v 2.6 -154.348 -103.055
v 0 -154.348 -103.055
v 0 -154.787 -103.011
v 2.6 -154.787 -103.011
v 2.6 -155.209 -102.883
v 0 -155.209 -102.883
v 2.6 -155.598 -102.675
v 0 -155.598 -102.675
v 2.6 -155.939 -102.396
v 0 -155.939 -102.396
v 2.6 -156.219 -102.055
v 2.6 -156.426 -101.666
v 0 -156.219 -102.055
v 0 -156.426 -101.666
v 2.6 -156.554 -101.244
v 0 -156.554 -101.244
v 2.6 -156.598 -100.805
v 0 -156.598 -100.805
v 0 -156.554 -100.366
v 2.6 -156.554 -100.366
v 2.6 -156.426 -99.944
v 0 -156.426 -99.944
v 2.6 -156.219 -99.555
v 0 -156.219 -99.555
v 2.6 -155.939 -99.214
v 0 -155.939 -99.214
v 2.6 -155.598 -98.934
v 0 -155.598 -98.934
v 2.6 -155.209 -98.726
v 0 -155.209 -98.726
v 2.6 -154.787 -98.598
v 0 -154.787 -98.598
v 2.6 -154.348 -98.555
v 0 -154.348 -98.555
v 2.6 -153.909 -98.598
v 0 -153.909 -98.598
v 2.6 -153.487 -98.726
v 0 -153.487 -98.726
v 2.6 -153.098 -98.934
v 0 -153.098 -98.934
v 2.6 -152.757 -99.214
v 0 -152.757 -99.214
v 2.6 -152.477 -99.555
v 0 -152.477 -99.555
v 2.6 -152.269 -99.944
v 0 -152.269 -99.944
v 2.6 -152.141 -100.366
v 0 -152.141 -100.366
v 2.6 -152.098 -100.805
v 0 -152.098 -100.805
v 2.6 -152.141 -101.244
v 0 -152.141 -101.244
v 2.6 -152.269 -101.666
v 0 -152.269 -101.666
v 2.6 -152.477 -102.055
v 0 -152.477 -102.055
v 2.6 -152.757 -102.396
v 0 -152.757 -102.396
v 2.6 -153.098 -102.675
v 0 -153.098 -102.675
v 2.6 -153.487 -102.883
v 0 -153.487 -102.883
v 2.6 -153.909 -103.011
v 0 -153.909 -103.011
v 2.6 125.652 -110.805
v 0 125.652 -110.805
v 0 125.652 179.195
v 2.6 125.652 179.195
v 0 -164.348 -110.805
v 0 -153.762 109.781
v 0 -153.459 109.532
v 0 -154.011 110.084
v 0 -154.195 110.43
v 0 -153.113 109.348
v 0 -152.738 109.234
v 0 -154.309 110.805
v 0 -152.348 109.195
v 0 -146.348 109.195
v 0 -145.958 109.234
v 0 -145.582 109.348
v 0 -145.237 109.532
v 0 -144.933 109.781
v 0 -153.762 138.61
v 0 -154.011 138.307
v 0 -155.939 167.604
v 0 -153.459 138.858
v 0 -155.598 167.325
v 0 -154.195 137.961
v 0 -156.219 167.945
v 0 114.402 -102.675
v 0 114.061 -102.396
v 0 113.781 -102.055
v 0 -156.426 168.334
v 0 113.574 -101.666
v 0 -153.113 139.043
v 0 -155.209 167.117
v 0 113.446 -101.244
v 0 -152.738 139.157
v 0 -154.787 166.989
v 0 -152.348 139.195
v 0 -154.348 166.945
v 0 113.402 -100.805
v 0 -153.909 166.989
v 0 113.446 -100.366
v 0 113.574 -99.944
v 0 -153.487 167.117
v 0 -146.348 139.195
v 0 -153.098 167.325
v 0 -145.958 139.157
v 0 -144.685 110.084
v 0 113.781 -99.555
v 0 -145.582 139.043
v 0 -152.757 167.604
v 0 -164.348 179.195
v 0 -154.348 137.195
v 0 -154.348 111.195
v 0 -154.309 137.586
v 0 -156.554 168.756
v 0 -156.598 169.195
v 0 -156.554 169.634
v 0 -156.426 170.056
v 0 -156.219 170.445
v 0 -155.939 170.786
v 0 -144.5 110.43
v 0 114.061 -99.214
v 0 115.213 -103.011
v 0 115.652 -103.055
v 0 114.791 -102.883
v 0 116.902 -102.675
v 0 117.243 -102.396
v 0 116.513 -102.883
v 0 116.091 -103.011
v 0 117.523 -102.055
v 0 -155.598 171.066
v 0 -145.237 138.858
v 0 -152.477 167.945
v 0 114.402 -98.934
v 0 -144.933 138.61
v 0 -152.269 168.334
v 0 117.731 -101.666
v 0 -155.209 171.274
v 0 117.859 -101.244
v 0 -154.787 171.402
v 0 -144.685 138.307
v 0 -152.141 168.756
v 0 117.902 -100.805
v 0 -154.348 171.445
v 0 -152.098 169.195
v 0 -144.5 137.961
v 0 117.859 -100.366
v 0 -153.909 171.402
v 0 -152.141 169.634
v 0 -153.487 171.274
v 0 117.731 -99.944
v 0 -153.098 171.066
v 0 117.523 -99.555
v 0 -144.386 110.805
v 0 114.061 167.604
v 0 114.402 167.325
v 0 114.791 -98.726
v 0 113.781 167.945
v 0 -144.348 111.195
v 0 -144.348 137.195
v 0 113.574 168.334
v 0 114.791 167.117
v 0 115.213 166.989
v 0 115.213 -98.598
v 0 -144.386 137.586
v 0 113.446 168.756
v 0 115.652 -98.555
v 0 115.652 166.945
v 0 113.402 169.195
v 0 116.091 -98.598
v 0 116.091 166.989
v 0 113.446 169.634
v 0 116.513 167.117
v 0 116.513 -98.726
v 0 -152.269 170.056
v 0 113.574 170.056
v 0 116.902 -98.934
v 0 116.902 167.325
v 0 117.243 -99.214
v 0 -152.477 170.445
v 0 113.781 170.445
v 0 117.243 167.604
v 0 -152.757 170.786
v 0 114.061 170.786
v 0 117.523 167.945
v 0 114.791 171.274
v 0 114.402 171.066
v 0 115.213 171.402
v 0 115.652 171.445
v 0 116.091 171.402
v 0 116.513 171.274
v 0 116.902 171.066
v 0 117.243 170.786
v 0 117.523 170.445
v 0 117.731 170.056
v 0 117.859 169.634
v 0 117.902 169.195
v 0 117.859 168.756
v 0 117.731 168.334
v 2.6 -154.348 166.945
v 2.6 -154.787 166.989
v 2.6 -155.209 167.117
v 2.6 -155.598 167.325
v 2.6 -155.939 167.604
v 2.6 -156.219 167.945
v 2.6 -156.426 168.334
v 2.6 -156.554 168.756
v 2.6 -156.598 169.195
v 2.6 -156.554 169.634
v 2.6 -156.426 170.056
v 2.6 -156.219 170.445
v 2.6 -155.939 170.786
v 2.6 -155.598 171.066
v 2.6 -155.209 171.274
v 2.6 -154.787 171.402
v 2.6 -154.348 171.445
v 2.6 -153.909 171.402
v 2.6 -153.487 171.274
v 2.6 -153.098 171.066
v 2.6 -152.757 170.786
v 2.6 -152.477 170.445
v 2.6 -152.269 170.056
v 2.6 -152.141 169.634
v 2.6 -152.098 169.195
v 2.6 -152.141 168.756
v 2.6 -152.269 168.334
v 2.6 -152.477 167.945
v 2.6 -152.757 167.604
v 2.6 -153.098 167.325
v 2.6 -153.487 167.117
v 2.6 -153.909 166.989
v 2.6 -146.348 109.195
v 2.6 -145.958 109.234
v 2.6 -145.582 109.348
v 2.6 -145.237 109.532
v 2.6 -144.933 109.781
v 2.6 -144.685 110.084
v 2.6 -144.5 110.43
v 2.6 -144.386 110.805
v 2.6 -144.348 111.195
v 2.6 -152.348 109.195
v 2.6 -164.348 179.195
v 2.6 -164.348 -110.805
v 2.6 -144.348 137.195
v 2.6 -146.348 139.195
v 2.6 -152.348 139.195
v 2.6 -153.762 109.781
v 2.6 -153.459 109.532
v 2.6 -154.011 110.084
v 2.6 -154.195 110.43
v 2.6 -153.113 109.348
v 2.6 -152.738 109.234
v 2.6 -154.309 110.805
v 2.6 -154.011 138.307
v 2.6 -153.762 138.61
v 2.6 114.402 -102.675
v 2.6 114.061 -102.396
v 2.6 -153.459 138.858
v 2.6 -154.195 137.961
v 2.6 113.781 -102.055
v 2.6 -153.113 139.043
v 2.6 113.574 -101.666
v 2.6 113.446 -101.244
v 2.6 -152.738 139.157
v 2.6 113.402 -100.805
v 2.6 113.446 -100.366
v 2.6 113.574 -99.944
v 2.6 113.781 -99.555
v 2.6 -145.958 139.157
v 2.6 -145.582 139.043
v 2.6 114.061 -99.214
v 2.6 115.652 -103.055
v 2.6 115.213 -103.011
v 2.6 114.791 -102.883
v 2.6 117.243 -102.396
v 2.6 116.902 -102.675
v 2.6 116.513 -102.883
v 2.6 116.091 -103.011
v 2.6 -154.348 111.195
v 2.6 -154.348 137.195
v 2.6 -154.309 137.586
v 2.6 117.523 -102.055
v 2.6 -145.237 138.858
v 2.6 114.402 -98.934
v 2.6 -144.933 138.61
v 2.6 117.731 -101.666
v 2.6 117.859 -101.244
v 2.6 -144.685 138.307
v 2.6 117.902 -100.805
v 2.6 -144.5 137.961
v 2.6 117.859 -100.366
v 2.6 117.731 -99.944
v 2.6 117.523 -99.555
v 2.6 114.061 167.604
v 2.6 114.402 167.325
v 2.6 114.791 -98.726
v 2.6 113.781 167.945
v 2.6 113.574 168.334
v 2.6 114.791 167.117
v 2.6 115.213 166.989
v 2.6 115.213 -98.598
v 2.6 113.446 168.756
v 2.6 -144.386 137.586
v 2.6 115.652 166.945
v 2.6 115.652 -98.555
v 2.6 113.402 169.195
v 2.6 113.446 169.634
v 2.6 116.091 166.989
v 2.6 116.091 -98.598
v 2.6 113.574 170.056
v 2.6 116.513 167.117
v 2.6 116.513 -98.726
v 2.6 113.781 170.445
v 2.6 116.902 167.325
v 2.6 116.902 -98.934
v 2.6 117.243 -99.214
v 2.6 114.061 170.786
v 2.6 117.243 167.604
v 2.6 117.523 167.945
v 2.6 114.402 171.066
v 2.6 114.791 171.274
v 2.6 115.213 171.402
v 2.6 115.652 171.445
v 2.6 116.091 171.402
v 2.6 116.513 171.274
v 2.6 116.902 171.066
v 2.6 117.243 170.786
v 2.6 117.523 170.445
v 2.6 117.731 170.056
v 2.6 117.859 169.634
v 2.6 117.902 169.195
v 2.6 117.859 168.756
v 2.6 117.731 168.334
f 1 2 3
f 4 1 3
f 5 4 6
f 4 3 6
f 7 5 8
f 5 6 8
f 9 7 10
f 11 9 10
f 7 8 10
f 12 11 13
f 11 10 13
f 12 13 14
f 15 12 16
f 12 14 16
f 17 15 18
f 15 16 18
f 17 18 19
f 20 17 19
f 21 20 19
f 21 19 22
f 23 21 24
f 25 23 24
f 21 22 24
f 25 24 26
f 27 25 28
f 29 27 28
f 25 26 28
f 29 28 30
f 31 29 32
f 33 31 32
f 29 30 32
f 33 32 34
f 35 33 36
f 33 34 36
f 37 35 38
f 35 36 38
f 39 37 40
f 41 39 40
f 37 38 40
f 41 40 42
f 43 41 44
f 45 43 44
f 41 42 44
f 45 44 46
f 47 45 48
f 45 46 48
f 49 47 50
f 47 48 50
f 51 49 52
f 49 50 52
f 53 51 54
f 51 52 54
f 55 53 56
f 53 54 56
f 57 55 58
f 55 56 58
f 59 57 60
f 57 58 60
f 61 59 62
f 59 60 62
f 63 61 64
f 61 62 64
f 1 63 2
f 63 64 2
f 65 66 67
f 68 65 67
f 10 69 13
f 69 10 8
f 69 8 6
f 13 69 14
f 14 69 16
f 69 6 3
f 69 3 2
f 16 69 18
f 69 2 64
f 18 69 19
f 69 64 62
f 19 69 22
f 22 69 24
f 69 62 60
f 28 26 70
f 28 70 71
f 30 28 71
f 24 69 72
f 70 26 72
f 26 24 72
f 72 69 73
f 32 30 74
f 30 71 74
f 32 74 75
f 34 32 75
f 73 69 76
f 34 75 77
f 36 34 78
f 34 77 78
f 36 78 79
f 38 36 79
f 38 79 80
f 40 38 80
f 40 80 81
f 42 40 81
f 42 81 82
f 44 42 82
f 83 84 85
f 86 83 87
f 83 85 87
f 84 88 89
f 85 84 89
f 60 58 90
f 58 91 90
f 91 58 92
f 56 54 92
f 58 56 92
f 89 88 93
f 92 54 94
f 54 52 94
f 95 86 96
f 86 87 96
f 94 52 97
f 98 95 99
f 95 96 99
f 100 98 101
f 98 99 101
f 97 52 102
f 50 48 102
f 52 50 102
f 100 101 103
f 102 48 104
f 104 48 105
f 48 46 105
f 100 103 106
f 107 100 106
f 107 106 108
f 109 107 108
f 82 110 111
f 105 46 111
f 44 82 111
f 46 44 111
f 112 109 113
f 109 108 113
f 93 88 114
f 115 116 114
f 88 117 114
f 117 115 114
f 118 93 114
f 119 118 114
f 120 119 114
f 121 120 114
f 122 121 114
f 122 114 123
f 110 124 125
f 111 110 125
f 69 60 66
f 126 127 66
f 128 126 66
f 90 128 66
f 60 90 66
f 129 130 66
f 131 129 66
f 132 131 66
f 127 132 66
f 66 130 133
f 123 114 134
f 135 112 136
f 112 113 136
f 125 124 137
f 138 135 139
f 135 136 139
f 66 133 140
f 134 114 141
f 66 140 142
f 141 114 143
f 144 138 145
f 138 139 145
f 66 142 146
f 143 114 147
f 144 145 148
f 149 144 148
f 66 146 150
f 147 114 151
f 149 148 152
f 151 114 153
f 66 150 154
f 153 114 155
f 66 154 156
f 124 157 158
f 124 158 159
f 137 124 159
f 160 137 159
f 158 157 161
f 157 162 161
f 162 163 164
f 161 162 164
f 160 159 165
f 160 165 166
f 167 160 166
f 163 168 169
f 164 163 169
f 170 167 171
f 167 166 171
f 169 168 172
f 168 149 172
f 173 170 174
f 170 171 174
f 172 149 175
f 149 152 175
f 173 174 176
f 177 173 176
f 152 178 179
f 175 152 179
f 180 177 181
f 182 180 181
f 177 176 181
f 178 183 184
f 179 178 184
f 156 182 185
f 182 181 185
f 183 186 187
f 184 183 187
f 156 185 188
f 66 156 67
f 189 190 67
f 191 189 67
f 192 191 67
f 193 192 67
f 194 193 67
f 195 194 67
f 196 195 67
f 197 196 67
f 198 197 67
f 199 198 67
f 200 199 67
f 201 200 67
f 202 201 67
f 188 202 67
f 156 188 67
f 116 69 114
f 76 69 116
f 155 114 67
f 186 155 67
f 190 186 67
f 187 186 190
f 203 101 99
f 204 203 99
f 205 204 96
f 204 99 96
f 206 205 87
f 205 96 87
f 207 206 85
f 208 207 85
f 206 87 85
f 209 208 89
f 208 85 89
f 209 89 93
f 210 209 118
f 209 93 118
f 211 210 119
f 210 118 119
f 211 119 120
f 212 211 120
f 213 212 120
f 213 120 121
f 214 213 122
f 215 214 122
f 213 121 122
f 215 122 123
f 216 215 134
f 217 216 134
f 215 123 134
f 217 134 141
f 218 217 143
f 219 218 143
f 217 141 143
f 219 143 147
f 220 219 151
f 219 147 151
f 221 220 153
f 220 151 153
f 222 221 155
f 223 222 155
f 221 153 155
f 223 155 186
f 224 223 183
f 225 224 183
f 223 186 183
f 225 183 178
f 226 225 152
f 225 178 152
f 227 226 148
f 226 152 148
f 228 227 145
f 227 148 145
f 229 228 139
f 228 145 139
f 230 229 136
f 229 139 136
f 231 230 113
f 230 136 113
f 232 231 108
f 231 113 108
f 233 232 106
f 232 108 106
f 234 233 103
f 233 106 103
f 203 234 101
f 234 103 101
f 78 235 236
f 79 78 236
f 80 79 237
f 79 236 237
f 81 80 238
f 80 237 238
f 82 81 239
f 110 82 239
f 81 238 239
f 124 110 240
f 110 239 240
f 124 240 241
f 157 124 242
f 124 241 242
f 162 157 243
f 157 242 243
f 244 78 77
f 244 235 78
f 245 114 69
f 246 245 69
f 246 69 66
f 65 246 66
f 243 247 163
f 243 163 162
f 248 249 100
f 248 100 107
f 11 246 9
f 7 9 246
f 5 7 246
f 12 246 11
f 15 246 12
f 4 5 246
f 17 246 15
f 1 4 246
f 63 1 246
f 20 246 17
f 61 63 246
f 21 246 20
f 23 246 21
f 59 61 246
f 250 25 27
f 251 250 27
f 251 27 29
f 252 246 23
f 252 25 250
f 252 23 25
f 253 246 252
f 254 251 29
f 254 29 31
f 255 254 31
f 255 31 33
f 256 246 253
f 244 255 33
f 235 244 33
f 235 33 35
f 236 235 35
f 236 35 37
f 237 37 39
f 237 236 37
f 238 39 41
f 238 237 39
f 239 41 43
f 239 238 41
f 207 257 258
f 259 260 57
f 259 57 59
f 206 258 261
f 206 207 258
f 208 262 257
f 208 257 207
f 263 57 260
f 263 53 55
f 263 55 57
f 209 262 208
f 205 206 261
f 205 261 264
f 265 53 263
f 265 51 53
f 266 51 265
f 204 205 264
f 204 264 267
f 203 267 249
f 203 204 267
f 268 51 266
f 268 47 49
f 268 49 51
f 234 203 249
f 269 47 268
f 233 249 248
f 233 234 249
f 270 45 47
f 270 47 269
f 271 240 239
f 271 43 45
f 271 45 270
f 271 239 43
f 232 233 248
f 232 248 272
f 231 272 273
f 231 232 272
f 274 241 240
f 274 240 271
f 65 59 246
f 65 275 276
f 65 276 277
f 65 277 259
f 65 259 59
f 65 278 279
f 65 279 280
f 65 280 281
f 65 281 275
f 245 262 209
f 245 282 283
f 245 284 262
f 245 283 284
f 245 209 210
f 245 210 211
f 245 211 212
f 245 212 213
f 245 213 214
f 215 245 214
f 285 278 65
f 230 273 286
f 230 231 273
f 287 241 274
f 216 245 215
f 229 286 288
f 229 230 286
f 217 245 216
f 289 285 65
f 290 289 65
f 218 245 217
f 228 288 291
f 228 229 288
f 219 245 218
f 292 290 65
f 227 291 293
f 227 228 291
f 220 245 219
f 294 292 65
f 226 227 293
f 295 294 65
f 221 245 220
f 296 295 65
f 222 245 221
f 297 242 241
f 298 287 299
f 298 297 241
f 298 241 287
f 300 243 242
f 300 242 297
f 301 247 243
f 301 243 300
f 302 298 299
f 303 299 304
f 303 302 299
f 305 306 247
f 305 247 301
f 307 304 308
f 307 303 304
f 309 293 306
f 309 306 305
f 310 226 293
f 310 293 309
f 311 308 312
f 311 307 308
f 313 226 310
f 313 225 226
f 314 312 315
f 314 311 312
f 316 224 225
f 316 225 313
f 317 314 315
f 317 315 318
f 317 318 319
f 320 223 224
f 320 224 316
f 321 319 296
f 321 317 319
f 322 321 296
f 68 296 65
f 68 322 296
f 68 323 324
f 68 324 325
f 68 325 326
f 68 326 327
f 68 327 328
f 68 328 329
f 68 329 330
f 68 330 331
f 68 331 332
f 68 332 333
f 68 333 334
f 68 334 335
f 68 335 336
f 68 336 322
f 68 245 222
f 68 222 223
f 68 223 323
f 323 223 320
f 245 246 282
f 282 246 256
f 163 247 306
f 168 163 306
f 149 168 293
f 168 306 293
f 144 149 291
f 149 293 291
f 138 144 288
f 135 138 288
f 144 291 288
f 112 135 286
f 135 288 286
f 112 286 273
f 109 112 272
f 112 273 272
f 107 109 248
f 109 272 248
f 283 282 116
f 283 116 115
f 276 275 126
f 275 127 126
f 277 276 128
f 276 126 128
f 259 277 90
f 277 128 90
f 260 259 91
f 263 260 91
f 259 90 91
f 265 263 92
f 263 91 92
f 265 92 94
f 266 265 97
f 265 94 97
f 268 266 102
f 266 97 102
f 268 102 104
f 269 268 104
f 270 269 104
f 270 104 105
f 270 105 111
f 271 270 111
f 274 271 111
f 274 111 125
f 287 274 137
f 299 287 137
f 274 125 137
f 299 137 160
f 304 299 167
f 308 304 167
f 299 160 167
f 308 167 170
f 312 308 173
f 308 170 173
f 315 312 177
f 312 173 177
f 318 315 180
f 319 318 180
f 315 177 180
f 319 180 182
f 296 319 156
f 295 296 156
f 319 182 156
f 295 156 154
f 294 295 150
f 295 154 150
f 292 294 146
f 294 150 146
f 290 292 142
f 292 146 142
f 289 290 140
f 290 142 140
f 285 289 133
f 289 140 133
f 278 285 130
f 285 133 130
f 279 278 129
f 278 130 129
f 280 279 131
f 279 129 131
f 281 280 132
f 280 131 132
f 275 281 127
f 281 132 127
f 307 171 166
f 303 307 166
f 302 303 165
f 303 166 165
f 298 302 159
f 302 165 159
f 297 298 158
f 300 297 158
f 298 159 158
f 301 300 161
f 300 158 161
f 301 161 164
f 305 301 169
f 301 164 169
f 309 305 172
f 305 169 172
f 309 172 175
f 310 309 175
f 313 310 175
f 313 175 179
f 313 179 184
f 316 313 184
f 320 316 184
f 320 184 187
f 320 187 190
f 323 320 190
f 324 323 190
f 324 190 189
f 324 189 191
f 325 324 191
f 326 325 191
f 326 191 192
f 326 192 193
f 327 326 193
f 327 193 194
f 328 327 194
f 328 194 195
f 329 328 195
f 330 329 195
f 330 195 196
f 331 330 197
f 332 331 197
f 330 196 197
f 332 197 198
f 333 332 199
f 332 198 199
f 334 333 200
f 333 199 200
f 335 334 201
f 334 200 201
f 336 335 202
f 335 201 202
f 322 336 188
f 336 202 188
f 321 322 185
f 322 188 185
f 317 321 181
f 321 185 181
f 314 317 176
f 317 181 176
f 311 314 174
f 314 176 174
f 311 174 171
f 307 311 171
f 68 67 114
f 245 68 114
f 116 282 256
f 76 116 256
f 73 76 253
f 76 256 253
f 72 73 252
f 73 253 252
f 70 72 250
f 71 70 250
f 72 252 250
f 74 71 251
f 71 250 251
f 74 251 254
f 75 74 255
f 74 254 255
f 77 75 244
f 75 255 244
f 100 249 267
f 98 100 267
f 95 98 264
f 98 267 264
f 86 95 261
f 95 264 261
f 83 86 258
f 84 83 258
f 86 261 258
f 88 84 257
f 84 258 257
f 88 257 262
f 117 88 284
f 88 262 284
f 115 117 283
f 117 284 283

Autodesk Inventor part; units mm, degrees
ref_plane "YZ Plane" through (0, 0, 0) normal (1, 0, 0) x (0, 1, 0)
ref_plane "XZ Plane" through (0, 0, 0) normal (0, 1, 0) x (-1, 0, 0)
ref_plane "XY Plane" through (0, 0, 0) normal (0, 0, 1) x (1, 0, 0)
sketch "スケッチ1" plane through (0, 0, 0) normal (1, 0, 0) x (0, 1, 0)
  line L0 (125.6523, 179.1954) -> (-164.3477, 179.1954)
  line L1 (-164.3477, 179.1954) -> (-164.3477, -110.8046)
  line L2 (-164.3477, -110.8046) -> (125.6523, -110.8046)
  line L3 (125.6523, -110.8046) -> (125.6523, 179.1954)
  point P0 (0, 0)
  dimension "d0" = 290
  dimension "d1" = 290
extrude "押し出し1" add sketch "スケッチ1" along normal blind 2.6
sketch "スケッチ2" plane through (2.6, 0, 0) normal (1, 0, 0) x (0, 0, -1)
  line L0 (-179.1954, 125.6523) -> (-179.1954, -164.3477) projected
  line L1 (-179.1954, -164.3477) -> (110.8046, -164.3477) projected
  line L2 (110.8046, -164.3477) -> (110.8046, 125.6523) projected
  line L3 (110.8046, 125.6523) -> (-179.1954, 125.6523) projected
  line L4 (-34.1954, -19.3477) -> (-34.1954, 125.6523)
  line L5 (110.8046, 125.6523) -> (-179.1954, 125.6523) projected
  line L6 (-34.1954, -19.3477) -> (110.8046, -19.3477)
  point P0 (0, 0)
  point P1 (-169.1954, 115.6523)
  point P2 (100.8046, 115.6523)
  point P3 (-169.1954, -154.3477)
  point P4 (100.8046, -154.3477)
  dimension "d4" = 10
  dimension "d5" = 10
hole "穴1" at (2.6, 115.6523, 169.1954) at (2.6, 115.6523, -100.8046) at (2.6, -154.3477, 169.1954) at (2.6, -154.3477, -100.8046) direction (-1, 0, 0) diameter 4.5 depth 10 tip angle 118
sketch "スケッチ4" plane through (2.6, 0, 0) normal (1, 0, 0) x (0, 0, -1)
  arc A0 (-111.1954, -154.3477) -> (-109.1954, -152.3477) centre (-111.1954, -152.3477) ccw projected
  line L0 (-111.1954, -154.3477) -> (-137.1954, -154.3477) projected
  arc A1 (-139.1954, -152.3477) -> (-137.1954, -154.3477) centre (-137.1954, -152.3477) ccw projected
  line L1 (-139.1954, -152.3477) -> (-139.1954, -146.3477) projected
  arc A2 (-137.1954, -144.3477) -> (-139.1954, -146.3477) centre (-137.1954, -146.3477) ccw projected
  line L2 (-137.1954, -144.3477) -> (-111.1954, -144.3477) projected
  arc A3 (-109.1954, -146.3477) -> (-111.1954, -144.3477) centre (-111.1954, -146.3477) ccw projected
  line L3 (-109.1954, -146.3477) -> (-109.1954, -152.3477) projected
  point P0 (0, 0)
extrude "押し出し3" cut sketch "スケッチ4" against normal through all
properties part number "lc_box_side" material "ポリカーボネート、クリア"
